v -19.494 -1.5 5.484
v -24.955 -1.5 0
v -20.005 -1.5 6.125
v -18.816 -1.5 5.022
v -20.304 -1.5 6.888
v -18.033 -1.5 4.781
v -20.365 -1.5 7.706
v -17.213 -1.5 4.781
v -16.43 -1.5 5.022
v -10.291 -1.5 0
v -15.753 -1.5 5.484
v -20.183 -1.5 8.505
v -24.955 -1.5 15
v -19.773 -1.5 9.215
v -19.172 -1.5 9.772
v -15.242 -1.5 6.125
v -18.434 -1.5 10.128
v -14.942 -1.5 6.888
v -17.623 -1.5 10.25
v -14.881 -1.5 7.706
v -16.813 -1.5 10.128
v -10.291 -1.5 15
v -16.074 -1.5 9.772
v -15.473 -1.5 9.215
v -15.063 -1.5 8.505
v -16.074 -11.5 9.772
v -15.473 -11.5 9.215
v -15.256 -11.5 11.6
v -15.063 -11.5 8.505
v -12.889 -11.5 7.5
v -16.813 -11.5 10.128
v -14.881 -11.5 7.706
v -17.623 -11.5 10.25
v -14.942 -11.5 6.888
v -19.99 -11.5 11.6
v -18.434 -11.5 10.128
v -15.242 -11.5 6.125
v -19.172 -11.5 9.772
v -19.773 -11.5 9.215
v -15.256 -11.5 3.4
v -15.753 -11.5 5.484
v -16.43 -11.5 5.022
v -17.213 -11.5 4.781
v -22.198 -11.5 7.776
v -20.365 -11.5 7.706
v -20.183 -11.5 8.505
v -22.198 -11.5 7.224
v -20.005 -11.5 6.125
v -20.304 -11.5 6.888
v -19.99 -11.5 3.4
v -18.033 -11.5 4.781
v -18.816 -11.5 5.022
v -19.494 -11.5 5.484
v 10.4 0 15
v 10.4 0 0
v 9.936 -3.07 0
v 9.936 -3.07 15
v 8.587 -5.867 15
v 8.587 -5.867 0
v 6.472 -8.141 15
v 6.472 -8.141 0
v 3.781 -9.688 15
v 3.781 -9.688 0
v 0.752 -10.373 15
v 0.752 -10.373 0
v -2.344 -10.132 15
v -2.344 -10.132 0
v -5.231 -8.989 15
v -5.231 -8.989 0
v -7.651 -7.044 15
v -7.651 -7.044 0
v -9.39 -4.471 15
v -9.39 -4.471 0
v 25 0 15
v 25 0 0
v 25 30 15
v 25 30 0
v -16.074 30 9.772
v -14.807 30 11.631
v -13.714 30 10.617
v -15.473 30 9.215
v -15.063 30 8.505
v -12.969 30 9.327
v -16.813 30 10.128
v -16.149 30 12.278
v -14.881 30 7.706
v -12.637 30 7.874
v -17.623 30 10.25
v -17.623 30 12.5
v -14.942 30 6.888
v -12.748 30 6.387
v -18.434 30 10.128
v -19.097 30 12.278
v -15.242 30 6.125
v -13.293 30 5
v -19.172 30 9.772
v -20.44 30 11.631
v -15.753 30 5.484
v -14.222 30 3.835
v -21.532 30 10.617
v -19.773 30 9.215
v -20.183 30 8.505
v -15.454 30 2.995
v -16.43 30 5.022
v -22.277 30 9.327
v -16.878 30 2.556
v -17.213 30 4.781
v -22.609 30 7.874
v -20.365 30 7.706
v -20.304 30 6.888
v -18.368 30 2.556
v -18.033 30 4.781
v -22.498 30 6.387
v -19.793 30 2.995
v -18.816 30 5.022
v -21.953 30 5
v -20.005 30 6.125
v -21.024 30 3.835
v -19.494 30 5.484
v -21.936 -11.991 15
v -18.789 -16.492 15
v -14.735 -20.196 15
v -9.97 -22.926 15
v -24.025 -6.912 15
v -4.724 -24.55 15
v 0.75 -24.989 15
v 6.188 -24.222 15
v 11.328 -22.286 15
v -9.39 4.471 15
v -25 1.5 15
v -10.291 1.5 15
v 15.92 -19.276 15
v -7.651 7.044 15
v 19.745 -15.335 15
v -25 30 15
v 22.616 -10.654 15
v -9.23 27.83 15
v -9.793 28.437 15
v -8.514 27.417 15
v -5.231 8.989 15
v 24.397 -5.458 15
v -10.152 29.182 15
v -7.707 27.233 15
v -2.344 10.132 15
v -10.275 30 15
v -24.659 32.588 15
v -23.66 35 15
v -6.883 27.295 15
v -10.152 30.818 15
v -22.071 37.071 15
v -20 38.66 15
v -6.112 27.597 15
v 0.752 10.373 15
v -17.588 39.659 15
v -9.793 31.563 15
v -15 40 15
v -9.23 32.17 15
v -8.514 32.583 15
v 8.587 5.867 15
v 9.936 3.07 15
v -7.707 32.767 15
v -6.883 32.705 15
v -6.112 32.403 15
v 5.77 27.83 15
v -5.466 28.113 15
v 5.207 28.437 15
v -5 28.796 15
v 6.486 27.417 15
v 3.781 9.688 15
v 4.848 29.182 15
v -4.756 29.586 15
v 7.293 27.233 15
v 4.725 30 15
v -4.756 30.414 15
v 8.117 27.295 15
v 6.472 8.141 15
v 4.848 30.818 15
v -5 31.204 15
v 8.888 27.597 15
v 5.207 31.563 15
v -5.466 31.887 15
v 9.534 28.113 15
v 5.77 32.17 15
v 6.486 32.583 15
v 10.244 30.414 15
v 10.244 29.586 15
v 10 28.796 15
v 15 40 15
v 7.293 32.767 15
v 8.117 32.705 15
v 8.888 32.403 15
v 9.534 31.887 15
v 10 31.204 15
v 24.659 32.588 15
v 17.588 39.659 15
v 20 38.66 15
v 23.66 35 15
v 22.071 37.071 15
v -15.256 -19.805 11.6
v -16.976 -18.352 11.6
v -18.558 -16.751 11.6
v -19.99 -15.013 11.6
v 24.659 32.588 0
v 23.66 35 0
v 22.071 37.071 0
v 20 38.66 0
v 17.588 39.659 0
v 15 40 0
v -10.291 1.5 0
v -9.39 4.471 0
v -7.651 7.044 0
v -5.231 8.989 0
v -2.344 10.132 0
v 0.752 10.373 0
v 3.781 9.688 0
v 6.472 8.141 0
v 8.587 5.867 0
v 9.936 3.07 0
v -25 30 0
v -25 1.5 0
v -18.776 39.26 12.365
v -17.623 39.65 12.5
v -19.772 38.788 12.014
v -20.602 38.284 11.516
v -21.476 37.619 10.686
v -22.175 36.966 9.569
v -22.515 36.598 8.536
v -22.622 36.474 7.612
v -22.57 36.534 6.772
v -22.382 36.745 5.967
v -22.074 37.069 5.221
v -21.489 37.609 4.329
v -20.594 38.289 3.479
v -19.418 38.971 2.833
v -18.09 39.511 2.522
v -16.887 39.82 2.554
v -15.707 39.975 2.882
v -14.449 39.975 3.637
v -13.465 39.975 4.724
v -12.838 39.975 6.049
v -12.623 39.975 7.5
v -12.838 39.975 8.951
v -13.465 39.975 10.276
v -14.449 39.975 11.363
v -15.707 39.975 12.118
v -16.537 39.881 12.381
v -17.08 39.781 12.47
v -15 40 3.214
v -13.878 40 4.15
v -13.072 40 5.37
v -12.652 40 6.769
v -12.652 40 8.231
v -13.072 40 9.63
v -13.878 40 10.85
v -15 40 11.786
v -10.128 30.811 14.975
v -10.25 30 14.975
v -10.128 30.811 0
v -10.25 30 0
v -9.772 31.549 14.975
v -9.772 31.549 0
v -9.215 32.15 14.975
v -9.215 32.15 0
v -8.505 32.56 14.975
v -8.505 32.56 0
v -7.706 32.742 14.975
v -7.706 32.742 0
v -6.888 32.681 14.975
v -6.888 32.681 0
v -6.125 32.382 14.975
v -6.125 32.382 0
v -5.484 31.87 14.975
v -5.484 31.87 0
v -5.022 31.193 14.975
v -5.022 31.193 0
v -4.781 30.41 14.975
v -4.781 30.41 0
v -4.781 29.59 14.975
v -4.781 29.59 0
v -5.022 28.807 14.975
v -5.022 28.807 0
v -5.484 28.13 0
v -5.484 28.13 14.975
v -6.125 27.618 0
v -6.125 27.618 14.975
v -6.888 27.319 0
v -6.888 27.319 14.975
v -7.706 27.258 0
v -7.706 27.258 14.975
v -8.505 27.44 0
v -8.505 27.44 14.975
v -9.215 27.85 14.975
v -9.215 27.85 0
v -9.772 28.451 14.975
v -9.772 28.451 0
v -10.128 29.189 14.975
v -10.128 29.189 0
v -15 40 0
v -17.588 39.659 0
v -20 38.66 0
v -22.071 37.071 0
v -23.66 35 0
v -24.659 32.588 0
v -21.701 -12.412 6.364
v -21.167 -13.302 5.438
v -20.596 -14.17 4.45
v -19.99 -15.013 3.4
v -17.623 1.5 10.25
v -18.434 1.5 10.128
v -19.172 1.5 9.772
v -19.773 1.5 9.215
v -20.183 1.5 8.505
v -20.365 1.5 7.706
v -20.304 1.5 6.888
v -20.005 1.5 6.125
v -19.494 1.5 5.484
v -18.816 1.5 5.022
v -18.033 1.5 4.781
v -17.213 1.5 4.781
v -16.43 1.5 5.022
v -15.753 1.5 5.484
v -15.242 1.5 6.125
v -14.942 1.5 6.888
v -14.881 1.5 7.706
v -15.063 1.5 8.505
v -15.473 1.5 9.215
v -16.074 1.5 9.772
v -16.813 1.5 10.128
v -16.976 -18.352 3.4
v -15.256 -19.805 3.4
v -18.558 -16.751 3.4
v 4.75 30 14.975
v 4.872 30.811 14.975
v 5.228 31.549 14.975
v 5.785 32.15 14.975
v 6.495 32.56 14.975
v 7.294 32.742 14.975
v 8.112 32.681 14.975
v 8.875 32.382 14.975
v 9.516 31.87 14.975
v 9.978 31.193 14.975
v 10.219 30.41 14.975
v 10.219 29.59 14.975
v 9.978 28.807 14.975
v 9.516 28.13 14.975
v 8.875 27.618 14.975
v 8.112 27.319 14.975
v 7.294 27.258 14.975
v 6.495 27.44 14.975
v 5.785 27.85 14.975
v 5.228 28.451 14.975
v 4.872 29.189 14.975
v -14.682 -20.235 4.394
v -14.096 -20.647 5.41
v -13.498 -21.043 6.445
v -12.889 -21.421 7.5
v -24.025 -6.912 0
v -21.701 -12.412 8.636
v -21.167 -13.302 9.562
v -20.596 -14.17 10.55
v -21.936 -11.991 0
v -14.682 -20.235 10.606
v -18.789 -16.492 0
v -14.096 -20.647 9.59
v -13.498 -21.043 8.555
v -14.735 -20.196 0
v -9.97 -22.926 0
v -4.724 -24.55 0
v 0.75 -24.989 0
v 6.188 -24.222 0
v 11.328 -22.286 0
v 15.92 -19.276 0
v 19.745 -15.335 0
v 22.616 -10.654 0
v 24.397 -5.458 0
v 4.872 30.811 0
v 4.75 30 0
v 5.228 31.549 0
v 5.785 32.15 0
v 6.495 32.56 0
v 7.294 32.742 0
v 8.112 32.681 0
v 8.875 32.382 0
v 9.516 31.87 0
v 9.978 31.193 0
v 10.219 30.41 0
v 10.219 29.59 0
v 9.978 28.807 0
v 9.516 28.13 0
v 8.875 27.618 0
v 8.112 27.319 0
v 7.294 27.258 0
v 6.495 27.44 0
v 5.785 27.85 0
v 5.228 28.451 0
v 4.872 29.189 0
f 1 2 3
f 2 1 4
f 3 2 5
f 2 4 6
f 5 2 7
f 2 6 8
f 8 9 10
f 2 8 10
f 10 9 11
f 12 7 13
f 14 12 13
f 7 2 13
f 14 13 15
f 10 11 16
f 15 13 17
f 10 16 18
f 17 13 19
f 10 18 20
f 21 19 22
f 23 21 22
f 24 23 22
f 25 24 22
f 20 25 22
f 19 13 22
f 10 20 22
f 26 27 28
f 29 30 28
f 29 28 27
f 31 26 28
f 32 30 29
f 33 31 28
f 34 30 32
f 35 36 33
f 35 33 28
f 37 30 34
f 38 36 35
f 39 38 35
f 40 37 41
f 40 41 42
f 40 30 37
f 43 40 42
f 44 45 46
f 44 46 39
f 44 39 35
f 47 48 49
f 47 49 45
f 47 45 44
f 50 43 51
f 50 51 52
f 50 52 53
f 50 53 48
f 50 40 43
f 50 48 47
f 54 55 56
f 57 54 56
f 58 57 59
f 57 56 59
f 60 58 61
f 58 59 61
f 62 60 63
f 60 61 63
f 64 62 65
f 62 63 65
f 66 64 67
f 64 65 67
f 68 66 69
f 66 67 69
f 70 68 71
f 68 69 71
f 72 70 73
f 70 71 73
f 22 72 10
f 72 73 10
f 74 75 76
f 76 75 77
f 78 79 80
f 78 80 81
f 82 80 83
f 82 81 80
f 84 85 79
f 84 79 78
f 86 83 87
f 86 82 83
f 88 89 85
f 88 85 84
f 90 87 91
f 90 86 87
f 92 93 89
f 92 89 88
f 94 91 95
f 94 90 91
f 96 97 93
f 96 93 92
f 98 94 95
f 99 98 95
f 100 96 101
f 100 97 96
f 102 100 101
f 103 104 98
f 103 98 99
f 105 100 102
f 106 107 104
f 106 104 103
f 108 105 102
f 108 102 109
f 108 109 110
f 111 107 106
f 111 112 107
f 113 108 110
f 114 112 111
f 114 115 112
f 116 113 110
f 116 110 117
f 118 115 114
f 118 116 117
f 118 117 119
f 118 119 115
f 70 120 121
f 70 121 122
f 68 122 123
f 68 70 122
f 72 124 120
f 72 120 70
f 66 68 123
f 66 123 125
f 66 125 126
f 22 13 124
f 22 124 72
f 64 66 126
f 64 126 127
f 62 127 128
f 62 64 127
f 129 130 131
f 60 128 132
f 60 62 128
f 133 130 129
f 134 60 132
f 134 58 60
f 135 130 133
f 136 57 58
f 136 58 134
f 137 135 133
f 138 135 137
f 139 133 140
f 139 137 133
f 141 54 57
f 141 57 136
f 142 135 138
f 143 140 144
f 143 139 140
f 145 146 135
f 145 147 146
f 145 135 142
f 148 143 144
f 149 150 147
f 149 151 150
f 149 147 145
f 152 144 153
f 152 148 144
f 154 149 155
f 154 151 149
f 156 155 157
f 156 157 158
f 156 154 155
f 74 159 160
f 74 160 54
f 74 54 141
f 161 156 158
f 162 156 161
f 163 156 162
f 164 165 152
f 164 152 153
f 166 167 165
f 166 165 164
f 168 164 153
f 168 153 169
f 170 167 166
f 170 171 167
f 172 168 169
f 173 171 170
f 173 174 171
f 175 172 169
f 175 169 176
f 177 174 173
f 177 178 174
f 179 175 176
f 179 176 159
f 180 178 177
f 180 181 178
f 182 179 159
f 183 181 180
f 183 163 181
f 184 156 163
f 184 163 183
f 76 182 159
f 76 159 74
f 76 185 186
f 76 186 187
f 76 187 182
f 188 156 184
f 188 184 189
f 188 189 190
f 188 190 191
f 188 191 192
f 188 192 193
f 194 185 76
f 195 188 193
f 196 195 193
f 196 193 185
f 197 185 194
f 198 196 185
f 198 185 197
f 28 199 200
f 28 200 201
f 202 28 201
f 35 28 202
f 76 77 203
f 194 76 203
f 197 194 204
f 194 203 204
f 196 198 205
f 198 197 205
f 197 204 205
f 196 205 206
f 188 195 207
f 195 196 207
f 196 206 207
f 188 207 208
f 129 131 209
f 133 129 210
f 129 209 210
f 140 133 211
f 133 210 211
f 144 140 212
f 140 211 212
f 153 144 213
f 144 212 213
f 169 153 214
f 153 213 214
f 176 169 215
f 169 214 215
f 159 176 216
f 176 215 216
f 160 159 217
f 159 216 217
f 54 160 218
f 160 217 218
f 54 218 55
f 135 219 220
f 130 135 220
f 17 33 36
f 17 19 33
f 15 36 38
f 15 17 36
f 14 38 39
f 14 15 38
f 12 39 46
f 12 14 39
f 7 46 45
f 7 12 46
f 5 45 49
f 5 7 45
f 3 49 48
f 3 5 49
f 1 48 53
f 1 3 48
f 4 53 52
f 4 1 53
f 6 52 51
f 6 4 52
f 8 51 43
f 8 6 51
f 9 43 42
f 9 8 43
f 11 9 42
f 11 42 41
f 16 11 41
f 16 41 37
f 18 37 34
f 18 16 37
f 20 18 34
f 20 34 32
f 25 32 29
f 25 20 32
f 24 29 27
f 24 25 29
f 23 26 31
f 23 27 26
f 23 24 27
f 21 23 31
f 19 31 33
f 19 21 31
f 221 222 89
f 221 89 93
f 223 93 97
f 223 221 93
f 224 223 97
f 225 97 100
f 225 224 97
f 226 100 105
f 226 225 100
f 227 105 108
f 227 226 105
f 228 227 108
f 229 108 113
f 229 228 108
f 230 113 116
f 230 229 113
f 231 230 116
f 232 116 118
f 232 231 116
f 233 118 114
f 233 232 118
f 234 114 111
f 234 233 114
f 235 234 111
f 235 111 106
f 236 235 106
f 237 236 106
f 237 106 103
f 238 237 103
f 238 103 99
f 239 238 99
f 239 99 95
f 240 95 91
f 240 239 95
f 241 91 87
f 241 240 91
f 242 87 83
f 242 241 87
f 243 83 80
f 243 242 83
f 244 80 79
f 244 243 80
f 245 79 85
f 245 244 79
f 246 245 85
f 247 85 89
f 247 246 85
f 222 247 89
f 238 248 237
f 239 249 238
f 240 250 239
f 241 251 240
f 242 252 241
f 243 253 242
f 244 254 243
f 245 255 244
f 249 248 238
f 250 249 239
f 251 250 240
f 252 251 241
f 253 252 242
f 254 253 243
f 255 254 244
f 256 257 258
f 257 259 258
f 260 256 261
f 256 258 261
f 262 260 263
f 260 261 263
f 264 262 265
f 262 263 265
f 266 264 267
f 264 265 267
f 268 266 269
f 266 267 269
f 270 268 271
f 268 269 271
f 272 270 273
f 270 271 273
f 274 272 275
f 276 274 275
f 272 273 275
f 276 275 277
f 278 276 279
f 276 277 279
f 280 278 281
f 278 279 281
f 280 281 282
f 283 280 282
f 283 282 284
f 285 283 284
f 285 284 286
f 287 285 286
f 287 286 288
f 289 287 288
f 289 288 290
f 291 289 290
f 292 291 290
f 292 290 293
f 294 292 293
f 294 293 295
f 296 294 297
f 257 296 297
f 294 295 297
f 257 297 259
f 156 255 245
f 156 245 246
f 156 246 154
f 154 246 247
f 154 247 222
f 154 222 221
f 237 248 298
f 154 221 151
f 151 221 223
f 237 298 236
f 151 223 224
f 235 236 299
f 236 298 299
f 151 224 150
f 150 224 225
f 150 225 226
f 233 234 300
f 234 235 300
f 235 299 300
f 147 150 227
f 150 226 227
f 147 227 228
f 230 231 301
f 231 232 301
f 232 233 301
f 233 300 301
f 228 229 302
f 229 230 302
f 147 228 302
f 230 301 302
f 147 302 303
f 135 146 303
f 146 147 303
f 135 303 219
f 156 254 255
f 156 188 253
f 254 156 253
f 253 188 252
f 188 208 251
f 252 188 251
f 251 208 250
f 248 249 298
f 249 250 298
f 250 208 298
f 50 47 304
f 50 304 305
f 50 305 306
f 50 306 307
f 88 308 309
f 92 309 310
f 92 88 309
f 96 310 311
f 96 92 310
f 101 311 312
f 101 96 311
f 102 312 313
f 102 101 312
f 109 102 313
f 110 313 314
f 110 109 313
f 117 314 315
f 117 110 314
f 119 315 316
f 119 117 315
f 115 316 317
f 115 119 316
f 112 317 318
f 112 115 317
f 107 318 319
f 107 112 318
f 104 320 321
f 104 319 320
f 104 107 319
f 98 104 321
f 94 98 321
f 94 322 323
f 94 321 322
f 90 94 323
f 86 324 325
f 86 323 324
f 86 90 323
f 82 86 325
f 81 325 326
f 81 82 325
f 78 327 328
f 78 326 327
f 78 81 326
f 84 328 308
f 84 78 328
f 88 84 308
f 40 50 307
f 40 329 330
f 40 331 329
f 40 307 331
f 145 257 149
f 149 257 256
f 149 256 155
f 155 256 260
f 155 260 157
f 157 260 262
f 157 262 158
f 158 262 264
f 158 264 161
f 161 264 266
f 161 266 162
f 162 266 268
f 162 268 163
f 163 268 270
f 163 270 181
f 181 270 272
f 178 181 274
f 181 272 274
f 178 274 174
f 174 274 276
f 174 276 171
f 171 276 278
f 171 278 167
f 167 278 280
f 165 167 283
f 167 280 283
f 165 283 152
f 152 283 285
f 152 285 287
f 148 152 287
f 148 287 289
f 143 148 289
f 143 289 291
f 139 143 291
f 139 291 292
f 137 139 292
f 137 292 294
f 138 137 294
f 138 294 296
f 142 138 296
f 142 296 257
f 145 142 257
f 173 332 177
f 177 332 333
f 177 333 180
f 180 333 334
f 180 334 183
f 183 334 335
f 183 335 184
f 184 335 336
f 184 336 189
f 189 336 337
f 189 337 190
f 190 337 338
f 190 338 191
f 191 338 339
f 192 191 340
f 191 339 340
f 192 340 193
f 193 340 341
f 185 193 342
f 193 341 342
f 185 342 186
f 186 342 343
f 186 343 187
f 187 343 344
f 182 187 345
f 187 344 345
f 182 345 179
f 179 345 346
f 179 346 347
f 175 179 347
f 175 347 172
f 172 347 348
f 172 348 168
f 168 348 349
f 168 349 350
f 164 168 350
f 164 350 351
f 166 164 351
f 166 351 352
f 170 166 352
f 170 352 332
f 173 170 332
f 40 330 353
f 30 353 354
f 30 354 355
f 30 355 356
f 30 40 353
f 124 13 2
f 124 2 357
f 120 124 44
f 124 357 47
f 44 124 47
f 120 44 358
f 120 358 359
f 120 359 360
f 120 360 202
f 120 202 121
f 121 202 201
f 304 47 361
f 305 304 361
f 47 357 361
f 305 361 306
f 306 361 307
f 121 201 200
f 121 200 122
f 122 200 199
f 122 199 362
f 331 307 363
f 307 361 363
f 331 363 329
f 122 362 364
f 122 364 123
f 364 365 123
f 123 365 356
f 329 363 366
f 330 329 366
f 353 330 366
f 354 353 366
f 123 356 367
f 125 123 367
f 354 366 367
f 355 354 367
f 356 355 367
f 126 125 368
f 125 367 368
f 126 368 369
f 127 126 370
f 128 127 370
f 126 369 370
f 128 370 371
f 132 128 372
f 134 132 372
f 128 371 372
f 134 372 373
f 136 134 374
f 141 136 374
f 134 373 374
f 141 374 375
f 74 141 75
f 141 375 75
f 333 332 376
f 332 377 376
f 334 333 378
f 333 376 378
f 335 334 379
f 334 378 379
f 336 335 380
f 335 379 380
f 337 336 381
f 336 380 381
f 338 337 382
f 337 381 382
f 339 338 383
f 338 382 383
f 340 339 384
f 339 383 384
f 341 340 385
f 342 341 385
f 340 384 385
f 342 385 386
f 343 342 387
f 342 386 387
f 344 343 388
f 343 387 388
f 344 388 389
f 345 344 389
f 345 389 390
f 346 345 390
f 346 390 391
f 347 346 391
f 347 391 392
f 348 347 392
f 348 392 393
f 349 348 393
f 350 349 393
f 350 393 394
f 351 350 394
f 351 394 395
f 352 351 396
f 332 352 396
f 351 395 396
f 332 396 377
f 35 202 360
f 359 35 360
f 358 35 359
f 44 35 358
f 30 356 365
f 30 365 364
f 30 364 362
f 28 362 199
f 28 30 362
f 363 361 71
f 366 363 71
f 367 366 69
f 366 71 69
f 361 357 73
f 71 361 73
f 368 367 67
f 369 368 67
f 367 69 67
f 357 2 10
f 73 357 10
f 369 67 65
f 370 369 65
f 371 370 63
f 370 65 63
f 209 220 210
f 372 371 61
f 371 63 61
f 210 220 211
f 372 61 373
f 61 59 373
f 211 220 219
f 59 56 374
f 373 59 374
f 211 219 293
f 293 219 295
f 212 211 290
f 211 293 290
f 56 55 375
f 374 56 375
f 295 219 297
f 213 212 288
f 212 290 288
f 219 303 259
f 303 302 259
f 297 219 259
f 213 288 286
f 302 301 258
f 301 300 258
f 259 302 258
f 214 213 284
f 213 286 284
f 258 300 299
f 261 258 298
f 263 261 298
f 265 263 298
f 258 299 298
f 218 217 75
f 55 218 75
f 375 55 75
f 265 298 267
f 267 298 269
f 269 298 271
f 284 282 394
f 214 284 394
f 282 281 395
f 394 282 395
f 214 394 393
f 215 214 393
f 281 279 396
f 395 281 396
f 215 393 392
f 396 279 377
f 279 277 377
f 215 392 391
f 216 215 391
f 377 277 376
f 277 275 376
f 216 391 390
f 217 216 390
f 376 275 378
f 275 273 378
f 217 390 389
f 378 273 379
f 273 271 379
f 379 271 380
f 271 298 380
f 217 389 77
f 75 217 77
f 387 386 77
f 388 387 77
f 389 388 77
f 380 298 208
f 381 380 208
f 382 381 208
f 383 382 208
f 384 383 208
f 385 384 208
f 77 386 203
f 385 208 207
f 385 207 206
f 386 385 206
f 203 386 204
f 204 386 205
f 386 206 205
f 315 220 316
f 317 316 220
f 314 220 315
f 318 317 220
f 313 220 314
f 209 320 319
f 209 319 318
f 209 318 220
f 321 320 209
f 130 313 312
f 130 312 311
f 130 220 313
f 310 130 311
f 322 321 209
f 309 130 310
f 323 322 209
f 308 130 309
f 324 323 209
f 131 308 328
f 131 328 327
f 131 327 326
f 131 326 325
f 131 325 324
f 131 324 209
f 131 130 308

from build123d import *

# Parameters (mm, degrees)
BOSS_EXTRUDE1_DEPTH            = 15
SKETCH3_W                      = 14.708741574
SKETCH3_H                      = 3
CUT_EXTRUDE1_DEPTH             = 50.497474683
M5_CLEARANCE_HOLE1_D           = 5.5
M5_CLEARANCE_HOLE1_CSINK_D     = 5.55
M5_CLEARANCE_HOLE1_CSINK_ANGLE = 90
FILLET1_R                      = 10
CUT_EXTRUDE2_DEPTH             = 60.179810901


with BuildPart() as part:
    # Sketch2 → Boss-Extrude1 (new body)
    with BuildSketch(Plane.XY):
        with BuildLine():
            Line((-25, 40), (-25, 0))
            ThreePointArc((-25, 0), (0, 25), (25, 0))
            Line((25, 0), (25, 40))
            Line((25, 40), (-25, 40))
        make_face()
        with BuildLine():
            ThreePointArc((25, 0), (0, 25), (-25, 0))
            Line((-25, 0), (-10.4, 0))
            ThreePointArc((-10.4, 0), (0, 10.4), (10.4, 0))
            Line((10.4, 0), (25, 0))
        make_face()
        with BuildLine():
            Line((-10.4, 0), (-25, 0))
            ThreePointArc((-25, 0), (0, -25), (25, 0))
            Line((25, 0), (10.4, 0))
            ThreePointArc((10.4, 0), (0, -10.4), (-10.4, 0))
        make_face()
    extrude(amount=BOSS_EXTRUDE1_DEPTH)

    # Sketch3 → Cut-Extrude1 (cut, through all)
    with BuildSketch(Plane.XY.offset(15)):
        with Locations((-17.645629213, 0)):
            Rectangle(SKETCH3_W, SKETCH3_H)
    extrude(amount=-CUT_EXTRUDE1_DEPTH, mode=Mode.SUBTRACT)

    # Sketch10 → CBORE for M5 SHCS3 (revolve, cut)
    with BuildSketch(Plane(origin=(-17.623108927, 40, 7.5), x_dir=(0, 0, 1), z_dir=(1, 0, 0))):
        Polygon((0, 0), (0, 65), (2.75, 65), (2.75, 10), (5, 10), (5, 0.025), (5.025, 0), align=None)
    revolve(axis=Axis((-17.623108927, 46.35, 7.5), (0, -1, 0)), mode=Mode.SUBTRACT)

    # M5 Clearance Hole1 (through all)
    with Locations(Plane.XY.offset(15)):
        with Locations((-7.5, 30), (7.5, 30)):
            CounterSinkHole(M5_CLEARANCE_HOLE1_D / 2, M5_CLEARANCE_HOLE1_CSINK_D / 2, counter_sink_angle=M5_CLEARANCE_HOLE1_CSINK_ANGLE)

    # Fillet1
    # the kernel refuses this fillet: 10 mm, written as the material it takes off along each edge
    with BuildSketch(Plane(origin=(-25, 40, -25), x_dir=(0, -1, 0), z_dir=(0, 0, 1))) as fillet1_piece_1:
        with BuildLine():
            CenterArc((FILLET1_R, FILLET1_R), FILLET1_R, 180, 90)
            Line((0, FILLET1_R), (0, 0))
            Line((0, 0), (FILLET1_R, 0))
        make_face()
    extrude(amount=65, mode=Mode.SUBTRACT)
    with BuildSketch(Plane(origin=(25, 40, -25), x_dir=(0, -1, 0), z_dir=(0, 0, 1))) as fillet1_piece_2:
        with BuildLine():
            CenterArc((FILLET1_R, -FILLET1_R), FILLET1_R, 90, 90)
            Line((0, -FILLET1_R), (0, 0))
            Line((0, 0), (FILLET1_R, 0))
        make_face()
    extrude(amount=65, mode=Mode.SUBTRACT)

    # Sketch18 → Cut-Extrude2 (cut, through all)
    with BuildSketch(Plane(origin=(0, -11.5, 0), x_dir=(1, 0, 0), z_dir=(0, 1, 0))):
        Polygon((-19.99024503, -3.4), (-15.255972823, -3.4), (-12.888836719, -7.5), (-15.255972823, -11.6), (-19.99024503, -11.6), (-22.357381134, -7.5), align=None)
    extrude(amount=-CUT_EXTRUDE2_DEPTH, mode=Mode.SUBTRACT)


solid = part.part
